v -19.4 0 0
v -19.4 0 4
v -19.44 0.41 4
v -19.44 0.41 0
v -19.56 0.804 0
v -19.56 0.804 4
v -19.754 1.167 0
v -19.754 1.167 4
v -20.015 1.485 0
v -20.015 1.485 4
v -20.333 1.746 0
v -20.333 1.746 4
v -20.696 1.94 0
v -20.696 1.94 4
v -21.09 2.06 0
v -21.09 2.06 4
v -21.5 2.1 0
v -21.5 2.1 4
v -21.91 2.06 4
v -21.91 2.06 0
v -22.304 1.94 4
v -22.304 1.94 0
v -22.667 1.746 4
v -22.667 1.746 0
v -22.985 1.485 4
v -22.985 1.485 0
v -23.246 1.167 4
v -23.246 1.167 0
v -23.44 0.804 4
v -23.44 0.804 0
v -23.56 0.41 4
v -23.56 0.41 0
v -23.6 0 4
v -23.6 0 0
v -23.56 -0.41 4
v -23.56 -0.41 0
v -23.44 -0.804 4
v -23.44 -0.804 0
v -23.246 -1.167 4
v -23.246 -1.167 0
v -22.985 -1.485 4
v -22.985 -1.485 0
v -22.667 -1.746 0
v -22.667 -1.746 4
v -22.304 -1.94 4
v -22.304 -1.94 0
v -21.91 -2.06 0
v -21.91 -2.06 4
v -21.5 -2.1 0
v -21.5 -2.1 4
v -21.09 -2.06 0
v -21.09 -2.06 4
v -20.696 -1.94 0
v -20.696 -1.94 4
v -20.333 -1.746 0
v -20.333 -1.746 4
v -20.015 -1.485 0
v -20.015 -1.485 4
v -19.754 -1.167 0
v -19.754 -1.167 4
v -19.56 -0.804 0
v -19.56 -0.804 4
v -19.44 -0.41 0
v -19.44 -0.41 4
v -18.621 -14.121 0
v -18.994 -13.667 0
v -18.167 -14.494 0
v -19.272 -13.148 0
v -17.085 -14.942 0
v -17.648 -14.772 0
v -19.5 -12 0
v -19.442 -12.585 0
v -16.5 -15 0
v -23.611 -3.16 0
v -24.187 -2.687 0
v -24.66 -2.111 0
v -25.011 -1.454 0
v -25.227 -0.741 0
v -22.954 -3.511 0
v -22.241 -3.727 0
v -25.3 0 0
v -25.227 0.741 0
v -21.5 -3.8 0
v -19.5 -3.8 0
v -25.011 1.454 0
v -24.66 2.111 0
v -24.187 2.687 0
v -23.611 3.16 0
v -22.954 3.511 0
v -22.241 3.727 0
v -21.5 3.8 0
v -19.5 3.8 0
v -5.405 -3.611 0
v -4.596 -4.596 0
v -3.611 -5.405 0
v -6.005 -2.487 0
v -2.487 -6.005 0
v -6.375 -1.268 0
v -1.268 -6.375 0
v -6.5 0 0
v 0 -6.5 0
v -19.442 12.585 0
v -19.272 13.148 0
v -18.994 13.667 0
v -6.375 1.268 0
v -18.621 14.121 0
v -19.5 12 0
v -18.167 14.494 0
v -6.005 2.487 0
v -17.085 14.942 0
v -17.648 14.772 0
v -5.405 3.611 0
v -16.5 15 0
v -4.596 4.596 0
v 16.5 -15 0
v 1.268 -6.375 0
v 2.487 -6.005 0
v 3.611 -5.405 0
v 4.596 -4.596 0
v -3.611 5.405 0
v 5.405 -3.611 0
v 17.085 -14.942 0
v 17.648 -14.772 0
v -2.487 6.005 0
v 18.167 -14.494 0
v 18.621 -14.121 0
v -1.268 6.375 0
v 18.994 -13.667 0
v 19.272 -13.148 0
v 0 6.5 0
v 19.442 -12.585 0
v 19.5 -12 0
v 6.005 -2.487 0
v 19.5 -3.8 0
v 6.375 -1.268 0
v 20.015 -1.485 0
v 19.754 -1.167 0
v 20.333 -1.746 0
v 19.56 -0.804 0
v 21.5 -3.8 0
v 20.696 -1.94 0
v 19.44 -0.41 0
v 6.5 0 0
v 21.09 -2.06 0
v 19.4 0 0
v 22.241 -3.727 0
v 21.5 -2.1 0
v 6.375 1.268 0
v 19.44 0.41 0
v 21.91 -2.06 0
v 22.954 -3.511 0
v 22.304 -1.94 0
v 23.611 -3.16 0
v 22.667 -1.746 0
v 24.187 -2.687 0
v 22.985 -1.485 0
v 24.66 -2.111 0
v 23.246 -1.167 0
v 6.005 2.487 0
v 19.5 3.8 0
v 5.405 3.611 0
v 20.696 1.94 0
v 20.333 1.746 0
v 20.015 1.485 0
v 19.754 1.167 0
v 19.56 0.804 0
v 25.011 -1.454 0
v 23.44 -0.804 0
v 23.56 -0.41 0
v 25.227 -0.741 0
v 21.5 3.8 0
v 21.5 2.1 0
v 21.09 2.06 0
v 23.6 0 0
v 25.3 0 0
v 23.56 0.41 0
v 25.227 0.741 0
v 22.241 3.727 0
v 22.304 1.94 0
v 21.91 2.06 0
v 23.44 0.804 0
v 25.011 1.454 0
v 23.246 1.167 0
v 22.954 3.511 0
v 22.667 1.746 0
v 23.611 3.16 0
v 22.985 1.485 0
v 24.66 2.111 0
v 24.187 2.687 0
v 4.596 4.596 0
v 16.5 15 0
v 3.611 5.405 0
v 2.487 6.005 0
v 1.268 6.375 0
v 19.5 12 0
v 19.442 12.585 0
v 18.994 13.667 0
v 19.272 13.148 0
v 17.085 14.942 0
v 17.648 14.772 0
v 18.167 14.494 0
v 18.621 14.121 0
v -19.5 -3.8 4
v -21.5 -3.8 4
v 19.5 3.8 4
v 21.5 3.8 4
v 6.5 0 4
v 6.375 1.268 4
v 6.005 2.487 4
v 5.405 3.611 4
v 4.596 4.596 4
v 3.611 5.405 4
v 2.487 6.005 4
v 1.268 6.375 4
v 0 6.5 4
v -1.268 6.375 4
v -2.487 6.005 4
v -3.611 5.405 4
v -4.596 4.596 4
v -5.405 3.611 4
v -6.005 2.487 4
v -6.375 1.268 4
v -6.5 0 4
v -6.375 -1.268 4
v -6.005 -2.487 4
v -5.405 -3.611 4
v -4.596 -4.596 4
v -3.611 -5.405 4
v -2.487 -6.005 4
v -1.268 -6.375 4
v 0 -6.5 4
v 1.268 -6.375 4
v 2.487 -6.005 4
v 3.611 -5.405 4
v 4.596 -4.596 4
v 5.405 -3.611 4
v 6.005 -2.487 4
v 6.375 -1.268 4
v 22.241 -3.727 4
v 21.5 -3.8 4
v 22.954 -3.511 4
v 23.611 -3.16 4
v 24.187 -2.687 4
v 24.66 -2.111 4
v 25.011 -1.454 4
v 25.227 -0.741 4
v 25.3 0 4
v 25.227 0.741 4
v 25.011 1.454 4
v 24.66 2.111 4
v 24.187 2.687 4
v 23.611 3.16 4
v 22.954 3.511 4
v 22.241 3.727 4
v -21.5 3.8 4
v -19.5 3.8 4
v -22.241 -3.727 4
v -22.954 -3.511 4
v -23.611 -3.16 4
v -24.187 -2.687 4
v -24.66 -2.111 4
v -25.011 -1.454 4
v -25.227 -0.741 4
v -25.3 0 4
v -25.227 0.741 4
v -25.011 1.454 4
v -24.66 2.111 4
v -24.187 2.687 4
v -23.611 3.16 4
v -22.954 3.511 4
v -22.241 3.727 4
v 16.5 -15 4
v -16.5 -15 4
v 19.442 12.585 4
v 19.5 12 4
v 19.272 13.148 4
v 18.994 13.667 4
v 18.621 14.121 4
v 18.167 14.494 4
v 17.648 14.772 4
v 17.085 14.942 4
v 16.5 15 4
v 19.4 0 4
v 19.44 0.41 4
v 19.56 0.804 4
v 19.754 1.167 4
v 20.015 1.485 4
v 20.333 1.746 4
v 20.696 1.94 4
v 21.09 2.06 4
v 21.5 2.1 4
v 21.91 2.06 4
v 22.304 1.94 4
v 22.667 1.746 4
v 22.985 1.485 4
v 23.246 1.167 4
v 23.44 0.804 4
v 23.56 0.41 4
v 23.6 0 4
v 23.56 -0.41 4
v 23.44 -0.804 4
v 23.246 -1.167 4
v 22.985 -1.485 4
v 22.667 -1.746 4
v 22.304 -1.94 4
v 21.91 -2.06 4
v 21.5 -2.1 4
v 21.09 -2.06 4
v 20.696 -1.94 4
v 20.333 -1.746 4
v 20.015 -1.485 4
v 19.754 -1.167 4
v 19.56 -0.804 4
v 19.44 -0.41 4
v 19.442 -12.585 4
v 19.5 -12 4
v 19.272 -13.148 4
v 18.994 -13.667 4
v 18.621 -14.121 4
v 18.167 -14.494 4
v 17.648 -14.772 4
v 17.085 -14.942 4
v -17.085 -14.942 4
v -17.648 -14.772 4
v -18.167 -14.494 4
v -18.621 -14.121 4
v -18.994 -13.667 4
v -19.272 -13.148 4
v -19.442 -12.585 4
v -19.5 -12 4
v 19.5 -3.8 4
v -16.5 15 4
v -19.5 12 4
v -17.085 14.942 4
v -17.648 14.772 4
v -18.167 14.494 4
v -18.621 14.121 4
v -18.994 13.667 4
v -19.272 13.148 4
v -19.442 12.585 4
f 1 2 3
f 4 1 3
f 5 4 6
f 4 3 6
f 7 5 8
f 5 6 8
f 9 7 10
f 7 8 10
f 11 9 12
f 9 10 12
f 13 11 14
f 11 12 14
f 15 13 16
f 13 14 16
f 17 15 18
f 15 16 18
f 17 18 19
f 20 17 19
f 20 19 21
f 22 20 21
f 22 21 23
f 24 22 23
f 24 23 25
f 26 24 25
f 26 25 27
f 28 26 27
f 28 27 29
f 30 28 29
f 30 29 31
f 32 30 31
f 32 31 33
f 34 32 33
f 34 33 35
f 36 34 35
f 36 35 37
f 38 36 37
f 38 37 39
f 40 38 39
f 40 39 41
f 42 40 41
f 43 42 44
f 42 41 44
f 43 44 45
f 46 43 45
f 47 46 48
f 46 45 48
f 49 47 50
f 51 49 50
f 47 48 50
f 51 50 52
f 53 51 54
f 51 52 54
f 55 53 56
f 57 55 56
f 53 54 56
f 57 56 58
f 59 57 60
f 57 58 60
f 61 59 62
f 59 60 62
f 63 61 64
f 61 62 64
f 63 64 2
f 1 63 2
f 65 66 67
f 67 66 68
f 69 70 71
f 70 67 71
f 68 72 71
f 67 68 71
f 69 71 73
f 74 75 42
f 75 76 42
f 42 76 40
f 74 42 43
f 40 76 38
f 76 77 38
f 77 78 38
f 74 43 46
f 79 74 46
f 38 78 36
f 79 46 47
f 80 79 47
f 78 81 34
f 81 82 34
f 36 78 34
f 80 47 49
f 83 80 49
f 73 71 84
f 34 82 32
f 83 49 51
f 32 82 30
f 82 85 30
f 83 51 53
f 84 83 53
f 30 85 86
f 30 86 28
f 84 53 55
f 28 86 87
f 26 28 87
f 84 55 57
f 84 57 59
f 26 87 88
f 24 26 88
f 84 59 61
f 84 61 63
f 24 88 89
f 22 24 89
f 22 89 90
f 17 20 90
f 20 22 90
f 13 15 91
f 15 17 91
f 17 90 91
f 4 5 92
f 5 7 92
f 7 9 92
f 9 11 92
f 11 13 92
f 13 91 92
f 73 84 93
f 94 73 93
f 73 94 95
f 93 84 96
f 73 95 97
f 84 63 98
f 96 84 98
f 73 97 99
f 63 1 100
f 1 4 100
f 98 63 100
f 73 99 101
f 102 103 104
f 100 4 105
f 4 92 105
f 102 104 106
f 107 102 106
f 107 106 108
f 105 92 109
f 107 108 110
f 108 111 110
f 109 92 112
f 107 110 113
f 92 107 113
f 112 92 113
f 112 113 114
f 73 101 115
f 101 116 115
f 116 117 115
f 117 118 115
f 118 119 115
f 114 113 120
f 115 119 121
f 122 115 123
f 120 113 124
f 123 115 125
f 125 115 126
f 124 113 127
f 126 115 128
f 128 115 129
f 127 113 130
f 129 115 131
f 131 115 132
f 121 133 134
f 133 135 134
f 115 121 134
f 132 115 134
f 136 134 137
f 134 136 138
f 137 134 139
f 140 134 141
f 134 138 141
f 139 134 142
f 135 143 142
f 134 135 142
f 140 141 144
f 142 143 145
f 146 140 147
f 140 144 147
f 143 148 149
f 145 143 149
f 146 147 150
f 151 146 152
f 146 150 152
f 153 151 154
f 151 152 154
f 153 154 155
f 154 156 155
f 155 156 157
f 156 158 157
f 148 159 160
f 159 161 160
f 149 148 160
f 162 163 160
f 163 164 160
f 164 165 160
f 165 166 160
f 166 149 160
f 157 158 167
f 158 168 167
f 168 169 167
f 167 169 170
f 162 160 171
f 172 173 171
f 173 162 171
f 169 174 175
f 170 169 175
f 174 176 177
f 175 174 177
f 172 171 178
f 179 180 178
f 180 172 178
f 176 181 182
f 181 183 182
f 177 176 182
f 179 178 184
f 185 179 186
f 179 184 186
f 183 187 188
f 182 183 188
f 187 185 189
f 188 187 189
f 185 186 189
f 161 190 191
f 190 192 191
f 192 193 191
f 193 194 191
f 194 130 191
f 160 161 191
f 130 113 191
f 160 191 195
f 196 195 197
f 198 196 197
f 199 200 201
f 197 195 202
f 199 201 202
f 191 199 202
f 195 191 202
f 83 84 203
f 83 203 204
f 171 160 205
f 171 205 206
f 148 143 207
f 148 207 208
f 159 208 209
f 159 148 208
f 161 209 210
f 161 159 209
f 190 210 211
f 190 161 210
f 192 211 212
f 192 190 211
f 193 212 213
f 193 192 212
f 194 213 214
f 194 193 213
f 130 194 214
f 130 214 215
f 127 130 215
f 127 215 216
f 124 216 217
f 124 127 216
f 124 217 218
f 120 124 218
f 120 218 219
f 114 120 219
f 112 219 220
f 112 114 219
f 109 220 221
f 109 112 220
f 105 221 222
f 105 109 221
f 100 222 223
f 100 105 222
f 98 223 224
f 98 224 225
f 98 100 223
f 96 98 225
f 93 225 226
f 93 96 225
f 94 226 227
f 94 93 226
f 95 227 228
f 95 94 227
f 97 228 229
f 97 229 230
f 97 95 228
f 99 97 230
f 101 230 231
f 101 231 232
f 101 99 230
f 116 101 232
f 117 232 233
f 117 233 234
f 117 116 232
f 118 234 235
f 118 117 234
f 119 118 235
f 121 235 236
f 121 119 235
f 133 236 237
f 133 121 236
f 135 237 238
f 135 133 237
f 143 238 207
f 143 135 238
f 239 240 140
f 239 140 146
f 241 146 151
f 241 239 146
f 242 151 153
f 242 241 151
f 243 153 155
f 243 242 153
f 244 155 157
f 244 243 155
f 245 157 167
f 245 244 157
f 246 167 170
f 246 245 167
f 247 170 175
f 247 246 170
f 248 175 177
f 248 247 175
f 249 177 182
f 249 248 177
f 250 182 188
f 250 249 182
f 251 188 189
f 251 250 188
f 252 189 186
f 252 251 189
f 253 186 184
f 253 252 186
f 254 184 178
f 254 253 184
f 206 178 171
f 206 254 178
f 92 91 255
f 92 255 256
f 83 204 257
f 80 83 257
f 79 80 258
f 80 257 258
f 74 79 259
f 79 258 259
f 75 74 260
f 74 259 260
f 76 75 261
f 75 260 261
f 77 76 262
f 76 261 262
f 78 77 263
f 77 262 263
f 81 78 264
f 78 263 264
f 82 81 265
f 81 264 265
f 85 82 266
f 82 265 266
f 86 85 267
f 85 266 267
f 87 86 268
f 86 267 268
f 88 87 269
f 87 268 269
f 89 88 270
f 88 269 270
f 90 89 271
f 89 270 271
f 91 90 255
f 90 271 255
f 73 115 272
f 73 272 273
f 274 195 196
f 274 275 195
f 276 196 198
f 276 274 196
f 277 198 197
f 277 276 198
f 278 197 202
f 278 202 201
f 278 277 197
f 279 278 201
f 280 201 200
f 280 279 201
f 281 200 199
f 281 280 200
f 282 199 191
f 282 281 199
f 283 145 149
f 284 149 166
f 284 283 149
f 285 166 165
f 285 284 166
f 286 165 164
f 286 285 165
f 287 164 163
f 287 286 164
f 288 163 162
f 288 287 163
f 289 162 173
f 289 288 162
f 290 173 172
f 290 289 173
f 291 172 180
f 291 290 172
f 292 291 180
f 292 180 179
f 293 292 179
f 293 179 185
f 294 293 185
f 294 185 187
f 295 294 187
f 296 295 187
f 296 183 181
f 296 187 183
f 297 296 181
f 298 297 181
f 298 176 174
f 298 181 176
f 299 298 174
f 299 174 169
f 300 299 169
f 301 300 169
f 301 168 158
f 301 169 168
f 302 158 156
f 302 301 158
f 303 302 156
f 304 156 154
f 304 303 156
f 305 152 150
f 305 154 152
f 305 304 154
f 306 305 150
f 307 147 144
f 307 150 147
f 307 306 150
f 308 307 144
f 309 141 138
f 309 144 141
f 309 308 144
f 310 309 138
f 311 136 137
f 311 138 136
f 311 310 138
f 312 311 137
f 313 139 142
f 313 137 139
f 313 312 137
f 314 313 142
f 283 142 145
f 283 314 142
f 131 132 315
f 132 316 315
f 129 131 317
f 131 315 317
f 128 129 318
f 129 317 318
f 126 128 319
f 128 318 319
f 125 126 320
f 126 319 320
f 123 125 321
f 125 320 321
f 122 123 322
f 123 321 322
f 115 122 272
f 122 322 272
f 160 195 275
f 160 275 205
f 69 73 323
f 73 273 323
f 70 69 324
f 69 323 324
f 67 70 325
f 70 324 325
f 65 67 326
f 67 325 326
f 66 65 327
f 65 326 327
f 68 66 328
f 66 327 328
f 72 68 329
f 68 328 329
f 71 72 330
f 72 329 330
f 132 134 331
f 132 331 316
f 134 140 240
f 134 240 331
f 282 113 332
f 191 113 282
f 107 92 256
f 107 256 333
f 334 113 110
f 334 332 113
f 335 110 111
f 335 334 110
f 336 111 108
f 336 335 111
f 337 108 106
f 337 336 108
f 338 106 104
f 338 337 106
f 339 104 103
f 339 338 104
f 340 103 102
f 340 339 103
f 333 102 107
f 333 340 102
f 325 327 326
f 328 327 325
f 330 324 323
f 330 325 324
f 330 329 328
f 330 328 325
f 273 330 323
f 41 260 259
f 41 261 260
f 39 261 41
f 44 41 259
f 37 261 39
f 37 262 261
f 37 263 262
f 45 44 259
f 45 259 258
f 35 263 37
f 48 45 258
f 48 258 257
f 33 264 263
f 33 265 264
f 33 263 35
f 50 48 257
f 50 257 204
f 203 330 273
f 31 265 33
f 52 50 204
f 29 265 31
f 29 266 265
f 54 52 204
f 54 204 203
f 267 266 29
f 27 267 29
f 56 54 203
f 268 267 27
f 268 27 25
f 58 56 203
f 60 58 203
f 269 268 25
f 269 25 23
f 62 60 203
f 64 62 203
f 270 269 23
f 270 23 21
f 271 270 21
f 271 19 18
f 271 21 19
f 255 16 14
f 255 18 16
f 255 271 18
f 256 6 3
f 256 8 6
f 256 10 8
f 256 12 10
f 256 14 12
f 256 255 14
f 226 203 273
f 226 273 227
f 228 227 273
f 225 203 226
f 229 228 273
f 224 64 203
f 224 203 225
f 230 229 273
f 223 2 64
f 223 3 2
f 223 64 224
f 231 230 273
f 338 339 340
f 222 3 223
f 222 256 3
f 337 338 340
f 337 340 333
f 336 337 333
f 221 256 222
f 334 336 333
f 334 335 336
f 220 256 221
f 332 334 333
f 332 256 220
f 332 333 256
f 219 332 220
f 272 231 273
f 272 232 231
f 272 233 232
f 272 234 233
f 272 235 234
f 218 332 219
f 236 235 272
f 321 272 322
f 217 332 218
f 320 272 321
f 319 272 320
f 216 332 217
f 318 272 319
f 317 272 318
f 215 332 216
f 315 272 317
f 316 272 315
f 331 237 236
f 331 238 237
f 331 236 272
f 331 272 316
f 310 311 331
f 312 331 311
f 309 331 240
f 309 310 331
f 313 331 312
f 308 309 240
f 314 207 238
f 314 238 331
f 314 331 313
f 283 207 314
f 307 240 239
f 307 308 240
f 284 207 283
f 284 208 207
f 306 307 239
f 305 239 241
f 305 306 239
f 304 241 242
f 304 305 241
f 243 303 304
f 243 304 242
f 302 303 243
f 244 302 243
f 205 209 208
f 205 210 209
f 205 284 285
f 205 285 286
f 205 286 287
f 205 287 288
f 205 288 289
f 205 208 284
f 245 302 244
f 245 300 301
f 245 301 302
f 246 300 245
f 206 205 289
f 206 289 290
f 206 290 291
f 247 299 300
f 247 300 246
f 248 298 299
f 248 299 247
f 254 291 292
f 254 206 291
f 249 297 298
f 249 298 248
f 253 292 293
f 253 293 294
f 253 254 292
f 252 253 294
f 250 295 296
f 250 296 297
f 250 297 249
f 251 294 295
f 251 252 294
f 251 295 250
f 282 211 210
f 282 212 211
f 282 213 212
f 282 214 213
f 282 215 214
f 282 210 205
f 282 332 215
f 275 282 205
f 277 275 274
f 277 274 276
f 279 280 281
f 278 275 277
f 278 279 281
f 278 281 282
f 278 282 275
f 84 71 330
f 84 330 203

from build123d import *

# Parameters (mm, degrees)
SKETCH1_R           = 6.5
BOSS_EXTRUDE1_DEPTH = 4
BOSS_EXTRUDE2_DEPTH = 4
SKETCH3_R           = 2.1
CUT_EXTRUDE1_DEPTH  = 30.683160209
FILLET1_R           = 3


with BuildPart() as part:
    # Sketch1 → Boss-Extrude1 (new body)
    with BuildSketch(Plane.XY):
        Polygon((19.5, 3.8), (21.5, 3.8), (21.5, -3.8), (19.5, -3.8), (19.5, -15), (-19.5, -15), (-19.5, -3.8), (-21.5, -3.8), (-21.5, 3.8), (-19.5, 3.8), (-19.5, 15), (19.5, 15), align=None)
        Circle(SKETCH1_R, mode=Mode.SUBTRACT)
    extrude(amount=BOSS_EXTRUDE1_DEPTH)

    # Sketch2 → Boss-Extrude2 (add)
    with BuildSketch(Plane.XY.offset(4)):
        with BuildLine():
            Line((-21.5, 3.8), (-21.5, -3.8))
            ThreePointArc((-21.5, -3.8), (-25.3, 0), (-21.5, 3.8))
        make_face()
    boss_extrude2 = extrude(amount=-BOSS_EXTRUDE2_DEPTH)

    # Sketch3 → Cut-Extrude1 (cut, through all)
    with BuildSketch(Plane.XY.offset(4)):
        with Locations((-21.5, 0)):
            Circle(SKETCH3_R)
    cut_extrude1 = extrude(amount=-CUT_EXTRUDE1_DEPTH, mode=Mode.SUBTRACT)

    # Mirror1: Boss-Extrude2, Cut-Extrude1 across plane
    add(boss_extrude2.mirror(Plane.ZY))
    add(cut_extrude1.mirror(Plane.ZY), mode=Mode.SUBTRACT)

    # Fillet1
    fillet1_edges = [part.edges().sort_by_distance(p)[0] for p in [
        (19.5, -15, 2),
        (-19.5, -15, 2),
        (-19.5, 15, 2),
        (19.5, 15, 2),
    ]]
    fillet(fillet1_edges, radius=FILLET1_R)


solid = part.part
